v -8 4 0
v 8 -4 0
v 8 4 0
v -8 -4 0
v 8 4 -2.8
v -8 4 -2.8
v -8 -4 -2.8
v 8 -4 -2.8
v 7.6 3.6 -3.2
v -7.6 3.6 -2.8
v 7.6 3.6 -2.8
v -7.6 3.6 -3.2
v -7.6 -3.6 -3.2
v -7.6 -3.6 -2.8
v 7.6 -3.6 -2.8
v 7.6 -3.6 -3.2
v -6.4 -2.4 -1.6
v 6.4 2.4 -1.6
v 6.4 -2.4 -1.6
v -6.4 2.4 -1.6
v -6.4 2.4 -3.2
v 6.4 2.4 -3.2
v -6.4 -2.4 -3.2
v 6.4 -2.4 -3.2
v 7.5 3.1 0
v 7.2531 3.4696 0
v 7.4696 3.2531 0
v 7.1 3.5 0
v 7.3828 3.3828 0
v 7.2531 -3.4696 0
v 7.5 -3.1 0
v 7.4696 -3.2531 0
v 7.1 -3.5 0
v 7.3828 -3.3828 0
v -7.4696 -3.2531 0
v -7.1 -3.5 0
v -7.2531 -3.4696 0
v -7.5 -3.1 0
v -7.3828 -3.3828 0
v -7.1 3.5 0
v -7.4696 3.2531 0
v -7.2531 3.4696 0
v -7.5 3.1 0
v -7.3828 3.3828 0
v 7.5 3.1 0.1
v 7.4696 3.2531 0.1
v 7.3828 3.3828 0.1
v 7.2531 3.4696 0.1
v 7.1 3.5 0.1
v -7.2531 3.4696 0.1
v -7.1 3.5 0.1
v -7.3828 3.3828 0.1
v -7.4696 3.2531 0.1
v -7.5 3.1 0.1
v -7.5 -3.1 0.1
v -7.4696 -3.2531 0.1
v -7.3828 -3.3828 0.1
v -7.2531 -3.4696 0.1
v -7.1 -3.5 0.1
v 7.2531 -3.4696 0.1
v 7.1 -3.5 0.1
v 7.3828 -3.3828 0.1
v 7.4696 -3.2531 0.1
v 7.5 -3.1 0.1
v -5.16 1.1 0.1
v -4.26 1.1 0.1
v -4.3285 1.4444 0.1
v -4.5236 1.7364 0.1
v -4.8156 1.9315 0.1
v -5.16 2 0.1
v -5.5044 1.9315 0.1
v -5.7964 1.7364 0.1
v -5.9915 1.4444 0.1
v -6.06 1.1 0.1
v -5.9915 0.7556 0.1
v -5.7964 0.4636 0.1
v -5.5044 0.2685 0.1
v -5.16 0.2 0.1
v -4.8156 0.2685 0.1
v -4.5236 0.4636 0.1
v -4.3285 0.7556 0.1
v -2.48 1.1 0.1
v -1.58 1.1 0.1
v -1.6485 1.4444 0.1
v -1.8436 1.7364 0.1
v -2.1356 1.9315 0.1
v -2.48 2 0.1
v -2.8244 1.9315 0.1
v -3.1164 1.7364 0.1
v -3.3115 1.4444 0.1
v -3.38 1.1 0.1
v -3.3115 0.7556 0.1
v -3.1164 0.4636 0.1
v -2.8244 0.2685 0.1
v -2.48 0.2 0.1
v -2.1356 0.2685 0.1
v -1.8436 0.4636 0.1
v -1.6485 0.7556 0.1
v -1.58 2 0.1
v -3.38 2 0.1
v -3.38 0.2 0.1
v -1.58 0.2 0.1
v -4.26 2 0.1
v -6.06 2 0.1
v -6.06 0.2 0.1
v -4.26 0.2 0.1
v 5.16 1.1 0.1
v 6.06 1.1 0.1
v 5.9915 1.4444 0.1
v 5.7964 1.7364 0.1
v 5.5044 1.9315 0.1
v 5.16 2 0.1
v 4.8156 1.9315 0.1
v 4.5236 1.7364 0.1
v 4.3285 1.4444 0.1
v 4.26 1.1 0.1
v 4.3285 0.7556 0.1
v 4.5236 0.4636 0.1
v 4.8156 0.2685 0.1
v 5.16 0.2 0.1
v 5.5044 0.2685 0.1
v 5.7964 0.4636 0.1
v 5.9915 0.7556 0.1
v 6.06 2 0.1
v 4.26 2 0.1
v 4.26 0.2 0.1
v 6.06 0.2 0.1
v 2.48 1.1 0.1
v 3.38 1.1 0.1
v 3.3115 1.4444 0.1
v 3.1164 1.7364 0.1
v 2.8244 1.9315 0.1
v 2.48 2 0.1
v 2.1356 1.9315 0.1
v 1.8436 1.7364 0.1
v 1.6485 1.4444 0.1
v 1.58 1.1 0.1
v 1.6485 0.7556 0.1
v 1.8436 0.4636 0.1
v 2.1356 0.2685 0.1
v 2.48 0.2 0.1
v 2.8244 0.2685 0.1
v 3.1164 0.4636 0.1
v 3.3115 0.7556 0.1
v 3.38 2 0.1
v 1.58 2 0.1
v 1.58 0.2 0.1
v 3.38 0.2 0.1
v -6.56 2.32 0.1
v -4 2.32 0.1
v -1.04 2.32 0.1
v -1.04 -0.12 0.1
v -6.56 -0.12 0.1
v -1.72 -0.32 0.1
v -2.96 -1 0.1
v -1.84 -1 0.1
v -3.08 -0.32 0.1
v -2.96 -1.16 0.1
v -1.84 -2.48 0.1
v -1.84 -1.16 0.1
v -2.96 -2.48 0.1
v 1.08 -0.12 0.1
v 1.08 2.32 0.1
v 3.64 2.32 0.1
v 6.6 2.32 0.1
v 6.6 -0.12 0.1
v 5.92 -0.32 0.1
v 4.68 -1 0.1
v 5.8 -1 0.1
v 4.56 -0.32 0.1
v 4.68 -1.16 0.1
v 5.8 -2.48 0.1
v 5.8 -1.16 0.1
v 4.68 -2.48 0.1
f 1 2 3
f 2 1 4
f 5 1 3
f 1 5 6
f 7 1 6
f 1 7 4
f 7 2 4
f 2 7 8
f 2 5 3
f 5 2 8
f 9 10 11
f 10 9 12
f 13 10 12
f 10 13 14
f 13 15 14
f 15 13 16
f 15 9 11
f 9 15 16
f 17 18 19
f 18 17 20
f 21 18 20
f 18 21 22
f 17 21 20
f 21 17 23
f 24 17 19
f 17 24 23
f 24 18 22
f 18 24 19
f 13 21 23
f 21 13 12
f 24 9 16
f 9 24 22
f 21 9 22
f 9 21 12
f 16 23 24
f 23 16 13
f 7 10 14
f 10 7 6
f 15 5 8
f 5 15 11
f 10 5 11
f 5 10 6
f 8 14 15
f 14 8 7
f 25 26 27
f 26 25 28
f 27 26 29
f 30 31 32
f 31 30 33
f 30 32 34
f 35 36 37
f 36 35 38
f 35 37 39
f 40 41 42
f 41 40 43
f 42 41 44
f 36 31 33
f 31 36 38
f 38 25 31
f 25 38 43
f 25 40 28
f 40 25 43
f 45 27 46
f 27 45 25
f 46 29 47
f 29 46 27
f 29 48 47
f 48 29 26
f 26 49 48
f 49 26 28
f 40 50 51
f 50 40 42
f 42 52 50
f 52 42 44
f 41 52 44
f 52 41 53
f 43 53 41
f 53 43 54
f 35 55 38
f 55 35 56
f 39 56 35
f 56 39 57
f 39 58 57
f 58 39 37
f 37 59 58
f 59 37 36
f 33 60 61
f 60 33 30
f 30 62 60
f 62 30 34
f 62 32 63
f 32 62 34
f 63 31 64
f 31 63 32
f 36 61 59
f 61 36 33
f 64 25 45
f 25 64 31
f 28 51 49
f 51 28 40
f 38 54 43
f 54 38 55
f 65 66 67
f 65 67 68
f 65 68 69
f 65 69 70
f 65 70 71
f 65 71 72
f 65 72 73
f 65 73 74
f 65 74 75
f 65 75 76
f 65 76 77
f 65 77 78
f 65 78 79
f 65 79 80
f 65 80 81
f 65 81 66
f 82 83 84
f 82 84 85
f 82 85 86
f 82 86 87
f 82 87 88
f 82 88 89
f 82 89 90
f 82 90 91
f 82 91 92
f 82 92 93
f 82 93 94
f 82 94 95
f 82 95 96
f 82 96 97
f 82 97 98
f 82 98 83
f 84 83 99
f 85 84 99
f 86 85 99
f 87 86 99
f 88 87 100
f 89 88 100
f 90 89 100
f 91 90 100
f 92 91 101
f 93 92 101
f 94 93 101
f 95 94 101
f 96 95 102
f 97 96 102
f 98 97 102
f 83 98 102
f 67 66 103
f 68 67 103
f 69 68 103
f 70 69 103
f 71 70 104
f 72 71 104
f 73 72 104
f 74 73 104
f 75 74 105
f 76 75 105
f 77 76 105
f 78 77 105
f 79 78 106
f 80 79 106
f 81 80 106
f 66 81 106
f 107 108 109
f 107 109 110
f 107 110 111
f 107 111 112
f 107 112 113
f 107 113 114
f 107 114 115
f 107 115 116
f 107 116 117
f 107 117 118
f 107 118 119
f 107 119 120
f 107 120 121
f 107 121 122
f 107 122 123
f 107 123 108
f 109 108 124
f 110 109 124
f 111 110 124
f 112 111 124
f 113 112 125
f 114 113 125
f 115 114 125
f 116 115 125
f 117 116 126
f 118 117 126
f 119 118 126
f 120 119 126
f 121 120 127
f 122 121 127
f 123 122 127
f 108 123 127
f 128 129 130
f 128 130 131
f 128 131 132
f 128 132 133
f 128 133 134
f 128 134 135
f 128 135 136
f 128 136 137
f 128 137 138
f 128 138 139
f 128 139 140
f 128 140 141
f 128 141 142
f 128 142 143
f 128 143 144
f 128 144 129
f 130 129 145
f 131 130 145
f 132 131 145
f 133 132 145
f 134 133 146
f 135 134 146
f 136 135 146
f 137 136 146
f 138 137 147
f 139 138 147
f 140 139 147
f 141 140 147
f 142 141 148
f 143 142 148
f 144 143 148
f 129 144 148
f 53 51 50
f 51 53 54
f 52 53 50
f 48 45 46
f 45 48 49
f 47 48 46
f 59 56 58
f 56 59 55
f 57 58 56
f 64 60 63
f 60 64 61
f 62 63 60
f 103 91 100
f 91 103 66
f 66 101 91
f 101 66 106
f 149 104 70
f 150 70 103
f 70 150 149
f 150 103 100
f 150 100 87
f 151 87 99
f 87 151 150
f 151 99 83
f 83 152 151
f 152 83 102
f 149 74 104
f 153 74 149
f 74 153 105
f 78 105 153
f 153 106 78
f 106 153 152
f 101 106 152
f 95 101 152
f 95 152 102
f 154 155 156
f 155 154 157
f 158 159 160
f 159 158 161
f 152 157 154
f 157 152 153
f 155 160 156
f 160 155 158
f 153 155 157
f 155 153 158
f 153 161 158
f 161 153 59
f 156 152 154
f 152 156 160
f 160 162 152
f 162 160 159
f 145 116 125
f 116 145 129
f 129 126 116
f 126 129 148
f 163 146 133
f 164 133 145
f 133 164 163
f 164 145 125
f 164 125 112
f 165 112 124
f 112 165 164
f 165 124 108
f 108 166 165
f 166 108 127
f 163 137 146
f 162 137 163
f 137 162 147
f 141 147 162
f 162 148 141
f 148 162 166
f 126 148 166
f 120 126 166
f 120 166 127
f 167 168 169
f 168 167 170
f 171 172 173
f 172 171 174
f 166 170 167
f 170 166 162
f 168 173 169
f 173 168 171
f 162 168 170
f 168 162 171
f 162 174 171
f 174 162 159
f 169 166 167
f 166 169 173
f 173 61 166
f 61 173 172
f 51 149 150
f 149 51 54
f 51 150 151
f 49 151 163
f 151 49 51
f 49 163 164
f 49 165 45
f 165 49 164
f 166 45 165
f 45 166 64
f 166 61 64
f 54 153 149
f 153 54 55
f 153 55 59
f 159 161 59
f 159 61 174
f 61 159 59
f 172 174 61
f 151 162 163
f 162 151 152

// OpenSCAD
// file: ../p/box5.scad
use <../lib.scad>
function ldraw_lib__box5() = [
// 0 Box with 5 Faces and All Edges
// 0 Name: box5.dat
// 0 Author: James Jessiman
// 0 !LDRAW_ORG Primitive UPDATE 2012-01
// 0 !LICENSE Licensed under CC BY 4.0 : see CAreadme.txt
// 
// 0 BFC CERTIFY CCW
  [0,"BFC","CERTIFY"],
  [0,"BFC","CCW"],
// 
// 0 !HISTORY 2002-04-03 [sbliss] Modified for BFC compliance
// 0 !HISTORY 2002-04-25 [PTadmin] Official Update 2002-02
// 0 !HISTORY 2007-06-24 [PTadmin] Header formatted for Contributor Agreement
// 0 !HISTORY 2008-07-01 [PTadmin] Official Update 2008-01
// 0 !HISTORY 2012-02-16 [Philo] Changed to CCW
// 0 !HISTORY 2012-03-30 [PTadmin] Official Update 2012-01
// 
// 
// 2 24 1 1 1 -1 1 1
  [2,24,1,1,1,-1,1,1],
// 2 24 -1 1 1 -1 1 -1
  [2,24,-1,1,1,-1,1,-1],
// 2 24 -1 1 -1 1 1 -1
  [2,24,-1,1,-1,1,1,-1],
// 2 24 1 1 -1 1 1 1
  [2,24,1,1,-1,1,1,1],
// 2 24 1 0 1 -1 0 1
  [2,24,1,0,1,-1,0,1],
// 2 24 -1 0 1 -1 0 -1
  [2,24,-1,0,1,-1,0,-1],
// 2 24 -1 0 -1 1 0 -1
  [2,24,-1,0,-1,1,0,-1],
// 2 24 1 0 -1 1 0 1
  [2,24,1,0,-1,1,0,1],
// 2 24 1 0 1 1 1 1
  [2,24,1,0,1,1,1,1],
// 2 24 -1 0 1 -1 1 1
  [2,24,-1,0,1,-1,1,1],
// 2 24 1 0 -1 1 1 -1
  [2,24,1,0,-1,1,1,-1],
// 2 24 -1 0 -1 -1 1 -1
  [2,24,-1,0,-1,-1,1,-1],
// 4 16 -1 1 1 1 1 1 1 1 -1 -1 1 -1
  [4,16,-1,1,1,1,1,1,1,1,-1,-1,1,-1],
// 4 16 -1 1 1 -1 0 1 1 0 1 1 1 1
  [4,16,-1,1,1,-1,0,1,1,0,1,1,1,1],
// 4 16 -1 1 -1 -1 0 -1 -1 0 1 -1 1 1
  [4,16,-1,1,-1,-1,0,-1,-1,0,1,-1,1,1],
// 4 16 1 1 -1 1 0 -1 -1 0 -1 -1 1 -1
  [4,16,1,1,-1,1,0,-1,-1,0,-1,-1,1,-1],
// 4 16 1 1 1 1 0 1 1 0 -1 1 1 -1
  [4,16,1,1,1,1,0,1,1,0,-1,1,1,-1],
];
module ldraw_lib__box5(step=0, col=false, unit=2/5, alt=false, line=0.2, solid=!$preview)
    makepoly(ldraw_lib__box5(), step=step, col=col, unit=unit, alt=alt, line=line, solid=solid);
ldraw_lib__box5(line=0.2);
// file: ../p/box4.scad
use <../lib.scad>
function ldraw_lib__box4() = [
// 0 Box with 4 Faces (2 Parallel Pairs) and All Edges
// 0 Name: box4.dat
// 0 Author: James Jessiman
// 0 !LDRAW_ORG Primitive UPDATE 2012-01
// 0 !LICENSE Licensed under CC BY 4.0 : see CAreadme.txt
// 
// 0 BFC CERTIFY CCW
  [0,"BFC","CERTIFY"],
  [0,"BFC","CCW"],
// 
// 0 !HISTORY 2002-04-03 [sbliss] Modified for BFC compliance
// 0 !HISTORY 2002-04-25 [PTadmin] Official Update 2002-02
// 0 !HISTORY 2007-06-24 [PTadmin] Header formatted for Contributor Agreement
// 0 !HISTORY 2008-07-01 [PTadmin] Official Update 2008-01
// 0 !HISTORY 2012-02-16 [Philo] Changed to CCW
// 0 !HISTORY 2012-03-30 [PTadmin] Official Update 2012-01
// 
// 
// 2 24 1 1 1 -1 1 1
  [2,24,1,1,1,-1,1,1],
// 2 24 -1 1 1 -1 1 -1
  [2,24,-1,1,1,-1,1,-1],
// 2 24 -1 1 -1 1 1 -1
  [2,24,-1,1,-1,1,1,-1],
// 2 24 1 1 -1 1 1 1
  [2,24,1,1,-1,1,1,1],
// 2 24 1 0 1 -1 0 1
  [2,24,1,0,1,-1,0,1],
// 2 24 -1 0 1 -1 0 -1
  [2,24,-1,0,1,-1,0,-1],
// 2 24 -1 0 -1 1 0 -1
  [2,24,-1,0,-1,1,0,-1],
// 2 24 1 0 -1 1 0 1
  [2,24,1,0,-1,1,0,1],
// 2 24 1 0 1 1 1 1
  [2,24,1,0,1,1,1,1],
// 2 24 -1 0 1 -1 1 1
  [2,24,-1,0,1,-1,1,1],
// 2 24 1 0 -1 1 1 -1
  [2,24,1,0,-1,1,1,-1],
// 2 24 -1 0 -1 -1 1 -1
  [2,24,-1,0,-1,-1,1,-1],
// 4 16 -1 1 1 -1 0 1 1 0 1 1 1 1
  [4,16,-1,1,1,-1,0,1,1,0,1,1,1,1],
// 4 16 -1 1 -1 -1 0 -1 -1 0 1 -1 1 1
  [4,16,-1,1,-1,-1,0,-1,-1,0,1,-1,1,1],
// 4 16 1 1 -1 1 0 -1 -1 0 -1 -1 1 -1
  [4,16,1,1,-1,1,0,-1,-1,0,-1,-1,1,-1],
// 4 16 1 1 1 1 0 1 1 0 -1 1 1 -1
  [4,16,1,1,1,1,0,1,1,0,-1,1,1,-1],
];
module ldraw_lib__box4(step=0, col=false, unit=2/5, alt=false, line=0.2, solid=!$preview)
    makepoly(ldraw_lib__box4(), step=step, col=col, unit=unit, alt=alt, line=line, solid=solid);
ldraw_lib__box4(line=0.2);
// file: ../p/4-4ndis.scad
use <../lib.scad>
function ldraw_lib__4_4ndis() = [
// 0 Disc Negative 1.0
// 0 Name: 4-4ndis.dat
// 0 Author: James Jessiman
// 0 !LDRAW_ORG Primitive UPDATE 2012-01
// 0 !LICENSE Licensed under CC BY 4.0 : see CAreadme.txt
// 
// 0 BFC CERTIFY CCW
  [0,"BFC","CERTIFY"],
  [0,"BFC","CCW"],
// 
// 0 !HISTORY 2002-03-23 [sbliss] Added BFC statement; compacted code
// 0 !HISTORY 2002-04-25 [PTadmin] Official Update 2002-02
// 0 !HISTORY 2007-06-24 [PTadmin] Header formatted for Contributor Agreement
// 0 !HISTORY 2008-07-01 [PTadmin] Official Update 2008-01
// 0 !HISTORY 2012-02-16 [Philo] Changed to CCW
// 0 !HISTORY 2012-03-30 [PTadmin] Official Update 2012-01
// 
// 
// 3 16 0.9239 0 0.3827 1 0 0 1 0 1
  [3,16,0.9239,0,0.3827,1,0,0,1,0,1],
// 3 16 0.7071 0 0.7071 0.9239 0 0.3827 1 0 1
  [3,16,0.7071,0,0.7071,0.9239,0,0.3827,1,0,1],
// 3 16 0.3827 0 0.9239 0.7071 0 0.7071 1 0 1
  [3,16,0.3827,0,0.9239,0.7071,0,0.7071,1,0,1],
// 3 16 0 0 1 0.3827 0 0.9239 1 0 1
  [3,16,0,0,1,0.3827,0,0.9239,1,0,1],
// 3 16 -0.3827 0 0.9239 0 0 1 -1 0 1
  [3,16,-0.3827,0,0.9239,0,0,1,-1,0,1],
// 3 16 -0.7071 0 0.7071 -0.3827 0 0.9239 -1 0 1
  [3,16,-0.7071,0,0.7071,-0.3827,0,0.9239,-1,0,1],
// 3 16 -0.9239 0 0.3827 -0.7071 0 0.7071 -1 0 1
  [3,16,-0.9239,0,0.3827,-0.7071,0,0.7071,-1,0,1],
// 3 16 -1 0 0 -0.9239 0 0.3827 -1 0 1
  [3,16,-1,0,0,-0.9239,0,0.3827,-1,0,1],
// 3 16 -0.9239 0 -0.3827 -1 0 0 -1 0 -1
  [3,16,-0.9239,0,-0.3827,-1,0,0,-1,0,-1],
// 3 16 -0.7071 0 -0.7071 -0.9239 0 -0.3827 -1 0 -1
  [3,16,-0.7071,0,-0.7071,-0.9239,0,-0.3827,-1,0,-1],
// 3 16 -0.3827 0 -0.9239 -0.7071 0 -0.7071 -1 0 -1
  [3,16,-0.3827,0,-0.9239,-0.7071,0,-0.7071,-1,0,-1],
// 3 16 0 0 -1 -0.3827 0 -0.9239 -1 0 -1
  [3,16,0,0,-1,-0.3827,0,-0.9239,-1,0,-1],
// 3 16 0.3827 0 -0.9239 0 0 -1 1 0 -1
  [3,16,0.3827,0,-0.9239,0,0,-1,1,0,-1],
// 3 16 0.7071 0 -0.7071 0.3827 0 -0.9239 1 0 -1
  [3,16,0.7071,0,-0.7071,0.3827,0,-0.9239,1,0,-1],
// 3 16 0.9239 0 -0.3827 0.7071 0 -0.7071 1 0 -1
  [3,16,0.9239,0,-0.3827,0.7071,0,-0.7071,1,0,-1],
// 3 16 1 0 0 0.9239 0 -0.3827 1 0 -1
  [3,16,1,0,0,0.9239,0,-0.3827,1,0,-1],
];
module ldraw_lib__4_4ndis(step=0, col=false, unit=2/5, alt=false, line=0.2, solid=!$preview)
    makepoly(ldraw_lib__4_4ndis(), step=step, col=col, unit=unit, alt=alt, line=line, solid=solid);
ldraw_lib__4_4ndis(line=0.2);
// file: ../p/4-4disc.scad
use <../lib.scad>
function ldraw_lib__4_4disc() = [
// 0 Disc 1.0
// 0 Name: 4-4disc.dat
// 0 Author: James Jessiman
// 0 !LDRAW_ORG Primitive UPDATE 2002-02
// 0 !LICENSE Licensed under CC BY 4.0 : see CAreadme.txt
// 
// 0 BFC CERTIFY CCW
  [0,"BFC","CERTIFY"],
  [0,"BFC","CCW"],
// 
// 0 !HISTORY 1998-12-15 [PTadmin] Official Update 1998-10
// 0 !HISTORY 2002-03-23 [sbliss] Added BFC statement
// 0 !HISTORY 2002-04-25 [PTadmin] Official Update 2002-02
// 0 !HISTORY 2007-06-24 [PTadmin] Header formatted for Contributor Agreement
// 0 !HISTORY 2008-07-01 [PTadmin] Official Update 2008-01
// 
// 
// 3 16 0 0 0 1 0 0 0.9239 0 0.3827
  [3,16,0,0,0,1,0,0,0.9239,0,0.3827],
// 3 16 0 0 0 0.9239 0 0.3827 0.7071 0 0.7071
  [3,16,0,0,0,0.9239,0,0.3827,0.7071,0,0.7071],
// 3 16 0 0 0 0.7071 0 0.7071 0.3827 0 0.9239
  [3,16,0,0,0,0.7071,0,0.7071,0.3827,0,0.9239],
// 3 16 0 0 0 0.3827 0 0.9239 0 0 1
  [3,16,0,0,0,0.3827,0,0.9239,0,0,1],
// 3 16 0 0 0 0 0 1 -0.3827 0 0.9239
  [3,16,0,0,0,0,0,1,-0.3827,0,0.9239],
// 3 16 0 0 0 -0.3827 0 0.9239 -0.7071 0 0.7071
  [3,16,0,0,0,-0.3827,0,0.9239,-0.7071,0,0.7071],
// 3 16 0 0 0 -0.7071 0 0.7071 -0.9239 0 0.3827
  [3,16,0,0,0,-0.7071,0,0.7071,-0.9239,0,0.3827],
// 3 16 0 0 0 -0.9239 0 0.3827 -1 0 -0
  [3,16,0,0,0,-0.9239,0,0.3827,-1,0,-0],
// 3 16 0 0 0 -1 0 -0 -0.9239 0 -0.3827
  [3,16,0,0,0,-1,0,-0,-0.9239,0,-0.3827],
// 3 16 0 0 0 -0.9239 0 -0.3827 -0.7071 0 -0.7071
  [3,16,0,0,0,-0.9239,0,-0.3827,-0.7071,0,-0.7071],
// 3 16 0 0 0 -0.7071 0 -0.7071 -0.3827 0 -0.9239
  [3,16,0,0,0,-0.7071,0,-0.7071,-0.3827,0,-0.9239],
// 3 16 0 0 0 -0.3827 0 -0.9239 0 0 -1
  [3,16,0,0,0,-0.3827,0,-0.9239,0,0,-1],
// 3 16 0 0 0 0 0 -1 0.3827 0 -0.9239
  [3,16,0,0,0,0,0,-1,0.3827,0,-0.9239],
// 3 16 0 0 0 0.3827 0 -0.9239 0.7071 0 -0.7071
  [3,16,0,0,0,0.3827,0,-0.9239,0.7071,0,-0.7071],
// 3 16 0 0 0 0.7071 0 -0.7071 0.9239 0 -0.3827
  [3,16,0,0,0,0.7071,0,-0.7071,0.9239,0,-0.3827],
// 3 16 0 0 0 0.9239 0 -0.3827 1 0 0
  [3,16,0,0,0,0.9239,0,-0.3827,1,0,0],
// 0
];
module ldraw_lib__4_4disc(step=0, col=false, unit=2/5, alt=false, line=0.2, solid=!$preview)
    makepoly(ldraw_lib__4_4disc(), step=step, col=col, unit=unit, alt=alt, line=line, solid=solid);
ldraw_lib__4_4disc(line=0.2);
// file: ../p/1-4cyli.scad
use <../lib.scad>
function ldraw_lib__1_4cyli() = [
// 0 Cylinder 0.25
// 0 Name: 1-4cyli.dat
// 0 Author: James Jessiman
// 0 !LDRAW_ORG Primitive UPDATE 2012-01
// 0 !LICENSE Licensed under CC BY 4.0 : see CAreadme.txt
// 
// 0 BFC CERTIFY CCW
  [0,"BFC","CERTIFY"],
  [0,"BFC","CCW"],
// 
// 0 !HISTORY 2002-03-23 [sbliss] Added BFC statement.
// 0 !HISTORY 2002-04-25 [PTadmin] Official Update 2002-02
// 0 !HISTORY 2007-06-22 [PTadmin] Header formatted for Contributor Agreement
// 0 !HISTORY 2008-07-01 [PTadmin] Official Update 2008-01
// 0 !HISTORY 2012-02-16 [Philo] Changed to CCW
// 0 !HISTORY 2012-03-30 [PTadmin] Official Update 2012-01
// 
// 
// 4 16 1 1 0 0.9239 1 0.3827 0.9239 0 0.3827 1 0 0
  [4,16,1,1,0,0.9239,1,0.3827,0.9239,0,0.3827,1,0,0],
// 5 24 1 0 0 1 1 0 0.9239 0 0.3827 1 0 -1
  [5,24,1,0,0,1,1,0,0.9239,0,0.3827,1,0,-1],
// 4 16 0.9239 1 0.3827 0.7071 1 0.7071 0.7071 0 0.7071 0.9239 0 0.3827
  [4,16,0.9239,1,0.3827,0.7071,1,0.7071,0.7071,0,0.7071,0.9239,0,0.3827],
// 5 24 0.9239 0 0.3827 0.9239 1 0.3827 0.7071 0 0.7071 1 0 0
  [5,24,0.9239,0,0.3827,0.9239,1,0.3827,0.7071,0,0.7071,1,0,0],
// 4 16 0.7071 1 0.7071 0.3827 1 0.9239 0.3827 0 0.9239 0.7071 0 0.7071
  [4,16,0.7071,1,0.7071,0.3827,1,0.9239,0.3827,0,0.9239,0.7071,0,0.7071],
// 5 24 0.7071 0 0.7071 0.7071 1 0.7071 0.3827 0 0.9239 0.9239 0 0.3827
  [5,24,0.7071,0,0.7071,0.7071,1,0.7071,0.3827,0,0.9239,0.9239,0,0.3827],
// 4 16 0.3827 1 0.9239 0 1 1 0 0 1 0.3827 0 0.9239
  [4,16,0.3827,1,0.9239,0,1,1,0,0,1,0.3827,0,0.9239],
// 5 24 0.3827 0 0.9239 0.3827 1 0.9239 0 0 1 0.7071 0 0.7071
  [5,24,0.3827,0,0.9239,0.3827,1,0.9239,0,0,1,0.7071,0,0.7071],
// 5 24 0 0 1 0 1 1 0.3827 0 0.9239 -1 0 1
  [5,24,0,0,1,0,1,1,0.3827,0,0.9239,-1,0,1],
];
module ldraw_lib__1_4cyli(step=0, col=false, unit=2/5, alt=false, line=0.2, solid=!$preview)
    makepoly(ldraw_lib__1_4cyli(), step=step, col=col, unit=unit, alt=alt, line=line, solid=solid);
ldraw_lib__1_4cyli(line=0.2);
// file: ../p/1-4chrd.scad
use <../lib.scad>
function ldraw_lib__1_4chrd() = [
// 0 Chord 0.25
// 0 Name: 1-4chrd.dat
// 0 Author: Max Martin Richter [MMR1988]
// 0 !LDRAW_ORG Primitive UPDATE 2023-05
// 0 !LICENSE Licensed under CC BY 4.0 : see CAreadme.txt
// 
// 0 BFC CERTIFY CCW
  [0,"BFC","CERTIFY"],
  [0,"BFC","CCW"],
// 
// 0 !HISTORY 2004-04-22 [PTadmin] Official Update 2004-02
// 0 !HISTORY 2007-10-09 [PTadmin] Header formatted for Contributor Agreement
// 0 !HISTORY 2008-07-01 [PTadmin] Official Update 2008-01
// 0 !HISTORY 2012-08-02 [MMR1988] Re-creation with PrimGen2 and Rectifier
// 0 !HISTORY 2012-08-09 [PTadmin] Official Update 2012-02
// 0 !HISTORY 2023-10-27 [OrionP] Change author to MMR1988 from hafhead
// 0 !HISTORY 2023-10-31 [OrionP] Official Update 2023-05
// 
// 4 16 0.9239 0 0.3827 0.3827 0 0.9239 0 0 1 1 0 0
  [4,16,0.9239,0,0.3827,0.3827,0,0.9239,0,0,1,1,0,0],
// 3 16 0.7071 0 0.7071 0.3827 0 0.9239 0.9239 0 0.3827
  [3,16,0.7071,0,0.7071,0.3827,0,0.9239,0.9239,0,0.3827],
];
module ldraw_lib__1_4chrd(step=0, col=false, unit=2/5, alt=false, line=0.2, solid=!$preview)
    makepoly(ldraw_lib__1_4chrd(), step=step, col=col, unit=unit, alt=alt, line=line, solid=solid);
ldraw_lib__1_4chrd(line=0.2);
// file: s/3069bs01.scad
use <../../lib.scad>
use <../../p/box4.scad>
use <../../p/box5.scad>
function ldraw_lib__s__3069bs01() = [
// 0 ~Tile  1 x  2 with Groove without Top Face
// 0 Name: s\3069bs01.dat
// 0 Author: Santeri Piippo [arezey]
// 0 !LDRAW_ORG Subpart UPDATE 2010-02
// 0 !LICENSE Licensed under CC BY 4.0 : see CAreadme.txt
// 
// 0 BFC CERTIFY CCW
  [0,"BFC","CERTIFY"],
  [0,"BFC","CCW"],
// 
// 0 !HISTORY 2010-07-05 [PTadmin] Official Update 2010-02
// 
// 
// 1 16 0 0 0 20 0 0 0 7 0 0 0 10 box4.dat
  [1,16,0,0,0,20,0,0,0,7,0,0,0,10, ldraw_lib__box4()],
// 1 16 0 7 0 19 0 0 0 1 0 0 0 9 box4.dat
  [1,16,0,7,0,19,0,0,0,1,0,0,0,9, ldraw_lib__box4()],
// 0 BFC INVERTNEXT
  [0,"BFC","INVERTNEXT"],
// 1 16 0 8 0 16 0 0 0 -4 0 0 0 6 box5.dat
  [1,16,0,8,0,16,0,0,0,-4,0,0,0,6, ldraw_lib__box5()],
// 4 16 -19 8 9 -16 8 6 -16 8 -6 -19 8 -9
  [4,16,-19,8,9,-16,8,6,-16,8,-6,-19,8,-9],
// 4 16 19 8 -9 16 8 -6 16 8 6 19 8 9
  [4,16,19,8,-9,16,8,-6,16,8,6,19,8,9],
// 4 16 19 8 9 16 8 6 -16 8 6 -19 8 9
  [4,16,19,8,9,16,8,6,-16,8,6,-19,8,9],
// 4 16 -19 8 -9 -16 8 -6 16 8 -6 19 8 -9
  [4,16,-19,8,-9,-16,8,-6,16,8,-6,19,8,-9],
// 4 16 -20 7 10 -19 7 9 -19 7 -9 -20 7 -10
  [4,16,-20,7,10,-19,7,9,-19,7,-9,-20,7,-10],
// 4 16 20 7 -10 19 7 -9 19 7 9 20 7 10
  [4,16,20,7,-10,19,7,-9,19,7,9,20,7,10],
// 4 16 20 7 10 19 7 9 -19 7 9 -20 7 10
  [4,16,20,7,10,19,7,9,-19,7,9,-20,7,10],
// 4 16 -20 7 -10 -19 7 -9 19 7 -9 20 7 -10
  [4,16,-20,7,-10,-19,7,-9,19,7,-9,20,7,-10],
// 0 //
];
module ldraw_lib__s__3069bs01(step=0, col=false, unit=2/5, alt=false, line=0.2, solid=!$preview)
    makepoly(ldraw_lib__s__3069bs01(), step=step, col=col, unit=unit, alt=alt, line=line, solid=solid);
ldraw_lib__s__3069bs01(line=0.2);
// file: 3069b.scad
use <../lib.scad>
use <s/3069bs01.scad>
function ldraw_lib__3069b() = [
// 0 Tile  1 x  2 with Groove
// 0 Name: 3069b.dat
// 0 Author: Santeri Piippo [arezey]
// 0 !LDRAW_ORG Part UPDATE 2010-02
// 0 !LICENSE Licensed under CC BY 4.0 : see CAreadme.txt
// 
// 0 BFC CERTIFY CCW
  [0,"BFC","CERTIFY"],
  [0,"BFC","CCW"],
// 
// 0 !KEYWORDS BrickLink 3069
// 
// 0 !HISTORY 2010-07-05 [PTadmin] Official Update 2010-02
// 
// 
// 4 16 20 0 -10 20 0 10 -20 0 10 -20 0 -10
  [4,16,20,0,-10,20,0,10,-20,0,10,-20,0,-10],
// 1 16 0 0 0 1 0 0 0 1 0 0 0 1 s\3069bs01.dat
  [1,16,0,0,0,1,0,0,0,1,0,0,0,1, ldraw_lib__s__3069bs01()],
// 0 //
];
module ldraw_lib__3069b(step=0, col=false, unit=2/5, alt=false, line=0.2, solid=!$preview)
    makepoly(ldraw_lib__3069b(), step=step, col=col, unit=unit, alt=alt, line=line, solid=solid);
ldraw_lib__3069b(line=0.2);
// main file
use <../lib.scad>
use <3069b.scad>
use <4510086a.scad>
function ldraw_lib__3069bd0a() = [
// 0 Tile  1 x  2 with Silver Controls and Blue and Red Dots Sticker
// 0 Name: 3069bd0a.dat
// 0 Author: Evert-Jan Boer [ejboer]
// 0 !LDRAW_ORG Shortcut UPDATE 2025-04
// 0 !LICENSE Licensed under CC BY 4.0 : see CAreadme.txt
// 
// 0 BFC CERTIFY CCW
  [0,"BFC","CERTIFY"],
  [0,"BFC","CCW"],
// 
// 0 !CATEGORY Sticker Shortcut
// 0 !KEYWORDS Bricklink 3069pb0620, Millennium Falcon, Set 10179
// 
// 0 !HISTORY 2025-04-27 [OrionP] Official Update 2025-04
// 
// 1 16 0 0 0 1 0 0 0 1 0 0 0 1 3069b.dat
  [1,16,0,0,0,1,0,0,0,1,0,0,0,1, ldraw_lib__3069b()],
// 1 16 0 0 0 1 0 0 0 1 0 0 0 1 4510086a.dat
  [1,16,0,0,0,1,0,0,0,1,0,0,0,1, ldraw_lib__4510086a()],
];
module ldraw_lib__3069bd0a(step=0, col=false, unit=2/5, alt=false, line=0.2, solid=!$preview)
    makepoly(ldraw_lib__3069bd0a(), step=step, col=col, unit=unit, alt=alt, line=line, solid=solid);
ldraw_lib__3069bd0a(line=0.2);
